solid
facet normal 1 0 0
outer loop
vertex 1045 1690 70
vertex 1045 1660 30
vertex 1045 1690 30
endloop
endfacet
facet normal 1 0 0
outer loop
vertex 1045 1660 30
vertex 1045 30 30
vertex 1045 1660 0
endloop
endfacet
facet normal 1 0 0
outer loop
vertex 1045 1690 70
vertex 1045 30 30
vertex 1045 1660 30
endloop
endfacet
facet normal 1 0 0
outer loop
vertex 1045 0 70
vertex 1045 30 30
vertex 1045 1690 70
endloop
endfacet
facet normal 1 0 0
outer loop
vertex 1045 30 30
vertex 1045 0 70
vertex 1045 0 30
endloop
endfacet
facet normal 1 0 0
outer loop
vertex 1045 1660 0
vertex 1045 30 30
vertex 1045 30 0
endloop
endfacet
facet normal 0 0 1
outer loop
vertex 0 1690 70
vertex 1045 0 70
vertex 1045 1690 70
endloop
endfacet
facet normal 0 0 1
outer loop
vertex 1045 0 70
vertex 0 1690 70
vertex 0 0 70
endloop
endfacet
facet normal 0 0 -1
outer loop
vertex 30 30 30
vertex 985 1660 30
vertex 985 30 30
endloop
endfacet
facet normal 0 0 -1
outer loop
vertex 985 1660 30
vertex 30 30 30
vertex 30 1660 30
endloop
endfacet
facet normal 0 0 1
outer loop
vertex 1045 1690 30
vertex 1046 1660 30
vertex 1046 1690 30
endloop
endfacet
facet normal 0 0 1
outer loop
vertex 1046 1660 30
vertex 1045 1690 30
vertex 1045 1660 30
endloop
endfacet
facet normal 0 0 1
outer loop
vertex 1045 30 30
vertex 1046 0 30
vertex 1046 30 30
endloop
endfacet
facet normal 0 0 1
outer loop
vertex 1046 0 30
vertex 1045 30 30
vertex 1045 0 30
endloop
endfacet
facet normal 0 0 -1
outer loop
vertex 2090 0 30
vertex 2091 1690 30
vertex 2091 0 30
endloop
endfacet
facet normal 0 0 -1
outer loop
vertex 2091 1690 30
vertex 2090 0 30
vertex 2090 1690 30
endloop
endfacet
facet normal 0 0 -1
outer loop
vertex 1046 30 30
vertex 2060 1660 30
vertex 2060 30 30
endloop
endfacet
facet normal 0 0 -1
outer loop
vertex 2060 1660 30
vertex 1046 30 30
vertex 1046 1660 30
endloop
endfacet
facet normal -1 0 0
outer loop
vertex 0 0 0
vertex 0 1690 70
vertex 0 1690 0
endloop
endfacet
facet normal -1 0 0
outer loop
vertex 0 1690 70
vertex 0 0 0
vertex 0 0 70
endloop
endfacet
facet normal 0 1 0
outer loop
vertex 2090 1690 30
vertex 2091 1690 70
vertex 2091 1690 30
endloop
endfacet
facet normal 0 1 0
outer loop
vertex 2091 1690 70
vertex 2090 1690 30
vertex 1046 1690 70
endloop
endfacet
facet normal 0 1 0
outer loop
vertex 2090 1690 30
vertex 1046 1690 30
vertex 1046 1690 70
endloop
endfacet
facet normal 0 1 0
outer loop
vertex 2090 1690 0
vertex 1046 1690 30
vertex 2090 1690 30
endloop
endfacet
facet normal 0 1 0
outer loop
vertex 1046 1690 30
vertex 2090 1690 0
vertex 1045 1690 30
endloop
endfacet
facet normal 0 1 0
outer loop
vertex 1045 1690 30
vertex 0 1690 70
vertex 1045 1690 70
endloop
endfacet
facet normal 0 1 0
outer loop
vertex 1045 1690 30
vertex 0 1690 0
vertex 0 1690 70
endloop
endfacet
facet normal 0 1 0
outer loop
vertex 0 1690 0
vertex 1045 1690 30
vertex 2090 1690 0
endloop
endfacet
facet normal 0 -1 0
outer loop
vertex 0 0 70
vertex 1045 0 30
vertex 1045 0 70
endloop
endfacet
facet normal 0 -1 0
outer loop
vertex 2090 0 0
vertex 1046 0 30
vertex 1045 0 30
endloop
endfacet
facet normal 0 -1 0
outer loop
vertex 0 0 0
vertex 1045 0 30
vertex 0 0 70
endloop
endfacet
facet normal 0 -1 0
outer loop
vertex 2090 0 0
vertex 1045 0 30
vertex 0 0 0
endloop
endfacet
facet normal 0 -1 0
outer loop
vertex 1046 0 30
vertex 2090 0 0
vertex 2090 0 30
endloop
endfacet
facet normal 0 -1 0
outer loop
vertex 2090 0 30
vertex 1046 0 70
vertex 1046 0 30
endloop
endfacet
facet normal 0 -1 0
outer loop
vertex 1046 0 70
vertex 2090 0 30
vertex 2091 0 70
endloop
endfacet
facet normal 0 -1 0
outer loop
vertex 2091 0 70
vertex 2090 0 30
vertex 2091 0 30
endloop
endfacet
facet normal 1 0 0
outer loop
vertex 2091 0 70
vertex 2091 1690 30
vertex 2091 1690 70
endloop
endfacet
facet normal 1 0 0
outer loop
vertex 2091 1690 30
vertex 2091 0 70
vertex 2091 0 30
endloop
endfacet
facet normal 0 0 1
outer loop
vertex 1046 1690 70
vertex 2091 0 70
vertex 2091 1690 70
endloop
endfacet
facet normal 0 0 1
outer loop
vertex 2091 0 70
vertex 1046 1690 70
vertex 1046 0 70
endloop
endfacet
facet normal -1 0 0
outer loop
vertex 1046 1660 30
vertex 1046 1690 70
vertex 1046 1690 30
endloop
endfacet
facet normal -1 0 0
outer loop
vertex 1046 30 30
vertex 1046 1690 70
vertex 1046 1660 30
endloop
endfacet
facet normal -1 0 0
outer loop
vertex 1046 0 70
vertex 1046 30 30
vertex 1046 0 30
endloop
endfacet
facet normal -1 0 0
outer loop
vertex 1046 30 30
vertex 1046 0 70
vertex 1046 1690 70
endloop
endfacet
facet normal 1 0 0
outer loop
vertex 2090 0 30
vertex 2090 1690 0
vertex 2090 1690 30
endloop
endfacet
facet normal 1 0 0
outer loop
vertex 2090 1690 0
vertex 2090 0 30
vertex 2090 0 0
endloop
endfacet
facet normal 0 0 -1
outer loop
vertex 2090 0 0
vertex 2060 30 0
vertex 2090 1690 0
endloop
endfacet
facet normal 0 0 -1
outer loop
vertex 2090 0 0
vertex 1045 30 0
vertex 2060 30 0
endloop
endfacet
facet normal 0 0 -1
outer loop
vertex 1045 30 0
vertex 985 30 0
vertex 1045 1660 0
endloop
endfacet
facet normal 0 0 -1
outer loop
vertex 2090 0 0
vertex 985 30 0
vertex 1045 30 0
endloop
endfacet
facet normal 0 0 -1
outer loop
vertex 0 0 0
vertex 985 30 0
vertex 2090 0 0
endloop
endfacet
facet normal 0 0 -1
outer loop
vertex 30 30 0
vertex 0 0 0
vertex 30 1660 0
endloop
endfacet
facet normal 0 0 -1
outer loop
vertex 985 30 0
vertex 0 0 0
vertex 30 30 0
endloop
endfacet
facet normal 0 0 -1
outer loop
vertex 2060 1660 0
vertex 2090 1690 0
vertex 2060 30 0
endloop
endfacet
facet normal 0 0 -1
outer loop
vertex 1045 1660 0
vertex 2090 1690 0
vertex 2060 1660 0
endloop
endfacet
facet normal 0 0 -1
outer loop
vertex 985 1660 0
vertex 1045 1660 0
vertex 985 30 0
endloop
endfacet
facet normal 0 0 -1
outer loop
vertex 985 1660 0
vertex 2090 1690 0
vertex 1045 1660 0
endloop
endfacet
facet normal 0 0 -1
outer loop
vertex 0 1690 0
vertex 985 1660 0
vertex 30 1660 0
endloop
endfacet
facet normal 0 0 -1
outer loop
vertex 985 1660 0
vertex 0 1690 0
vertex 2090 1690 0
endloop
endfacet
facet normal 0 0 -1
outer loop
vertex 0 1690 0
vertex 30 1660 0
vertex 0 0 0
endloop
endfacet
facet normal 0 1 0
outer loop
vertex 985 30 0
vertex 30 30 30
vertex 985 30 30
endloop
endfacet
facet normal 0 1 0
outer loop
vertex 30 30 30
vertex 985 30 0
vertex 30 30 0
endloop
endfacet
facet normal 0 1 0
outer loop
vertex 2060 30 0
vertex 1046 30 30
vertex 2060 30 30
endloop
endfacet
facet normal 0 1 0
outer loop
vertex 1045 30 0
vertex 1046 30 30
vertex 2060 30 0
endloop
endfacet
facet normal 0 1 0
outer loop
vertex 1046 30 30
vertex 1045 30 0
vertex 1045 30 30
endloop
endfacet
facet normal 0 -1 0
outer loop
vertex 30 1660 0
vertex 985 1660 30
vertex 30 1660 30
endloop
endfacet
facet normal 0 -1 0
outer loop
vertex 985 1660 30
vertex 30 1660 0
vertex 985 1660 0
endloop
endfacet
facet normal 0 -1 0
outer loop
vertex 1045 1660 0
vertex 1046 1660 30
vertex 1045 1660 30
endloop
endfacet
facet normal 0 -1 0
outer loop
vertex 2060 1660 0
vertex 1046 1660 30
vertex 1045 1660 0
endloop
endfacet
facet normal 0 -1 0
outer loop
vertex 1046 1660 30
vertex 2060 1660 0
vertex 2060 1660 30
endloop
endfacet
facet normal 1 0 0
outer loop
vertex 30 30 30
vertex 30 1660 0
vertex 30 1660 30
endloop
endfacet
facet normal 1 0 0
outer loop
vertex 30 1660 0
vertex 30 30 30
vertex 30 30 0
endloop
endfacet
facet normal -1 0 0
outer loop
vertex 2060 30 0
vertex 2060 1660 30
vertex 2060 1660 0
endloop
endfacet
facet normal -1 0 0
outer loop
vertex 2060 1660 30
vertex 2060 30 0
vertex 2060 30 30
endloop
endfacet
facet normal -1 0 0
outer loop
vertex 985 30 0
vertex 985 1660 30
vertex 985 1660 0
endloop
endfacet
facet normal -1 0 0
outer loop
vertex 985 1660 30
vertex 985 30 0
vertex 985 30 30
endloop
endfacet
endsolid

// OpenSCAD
solarpanel_width = 1045;
solarpanel_length = 1690;
solarpanel_height = 40;

profile_width = 30;

module solarpanel()
{
    color("gray")
        cube([solarpanel_width,solarpanel_length,solarpanel_height]);
}

module profile_aft_fore()
{
    color("silver")
        cube([solarpanel_width*2,profile_width,profile_width]);
}

module profile_sides()
{
    color("silver")
        cube([solarpanel_length-profile_width*2,profile_width,profile_width]);
}

module profile_middle()
{
    color("silver")
        cube([solarpanel_length-profile_width*2,profile_width*2,profile_width]);
}

module solarinstallation()
{
    translate([0,0,profile_width])
        solarpanel();
    translate([solarpanel_width+1,0,profile_width])
        solarpanel();
    profile_aft_fore();
    translate([0,solarpanel_length-profile_width,0])
        profile_aft_fore();
    translate([profile_width,profile_width,0])
        rotate([0,0,90])
            profile_sides();
    translate([solarpanel_width*2,profile_width,0])
        rotate([0,0,90])
            profile_sides();
    translate([solarpanel_width,profile_width,0])
        rotate([0,0,90])
            profile_middle();
}

module print_dimensions()
{
    echo("Profile aft/fore, 2 of ", solarpanel_width*2, "mm of ", profile_width, "x", profile_width, " mm");
    echo("Profile sides, 2 of ", solarpanel_length-profile_width*2, "mm of ", profile_width, "x", profile_width, " mm");
    echo("Profile middle, 1 of ", solarpanel_length-profile_width*2, "mm of ", profile_width*2, "x", profile_width, " mm");
}


solarinstallation();
print_dimensions();
